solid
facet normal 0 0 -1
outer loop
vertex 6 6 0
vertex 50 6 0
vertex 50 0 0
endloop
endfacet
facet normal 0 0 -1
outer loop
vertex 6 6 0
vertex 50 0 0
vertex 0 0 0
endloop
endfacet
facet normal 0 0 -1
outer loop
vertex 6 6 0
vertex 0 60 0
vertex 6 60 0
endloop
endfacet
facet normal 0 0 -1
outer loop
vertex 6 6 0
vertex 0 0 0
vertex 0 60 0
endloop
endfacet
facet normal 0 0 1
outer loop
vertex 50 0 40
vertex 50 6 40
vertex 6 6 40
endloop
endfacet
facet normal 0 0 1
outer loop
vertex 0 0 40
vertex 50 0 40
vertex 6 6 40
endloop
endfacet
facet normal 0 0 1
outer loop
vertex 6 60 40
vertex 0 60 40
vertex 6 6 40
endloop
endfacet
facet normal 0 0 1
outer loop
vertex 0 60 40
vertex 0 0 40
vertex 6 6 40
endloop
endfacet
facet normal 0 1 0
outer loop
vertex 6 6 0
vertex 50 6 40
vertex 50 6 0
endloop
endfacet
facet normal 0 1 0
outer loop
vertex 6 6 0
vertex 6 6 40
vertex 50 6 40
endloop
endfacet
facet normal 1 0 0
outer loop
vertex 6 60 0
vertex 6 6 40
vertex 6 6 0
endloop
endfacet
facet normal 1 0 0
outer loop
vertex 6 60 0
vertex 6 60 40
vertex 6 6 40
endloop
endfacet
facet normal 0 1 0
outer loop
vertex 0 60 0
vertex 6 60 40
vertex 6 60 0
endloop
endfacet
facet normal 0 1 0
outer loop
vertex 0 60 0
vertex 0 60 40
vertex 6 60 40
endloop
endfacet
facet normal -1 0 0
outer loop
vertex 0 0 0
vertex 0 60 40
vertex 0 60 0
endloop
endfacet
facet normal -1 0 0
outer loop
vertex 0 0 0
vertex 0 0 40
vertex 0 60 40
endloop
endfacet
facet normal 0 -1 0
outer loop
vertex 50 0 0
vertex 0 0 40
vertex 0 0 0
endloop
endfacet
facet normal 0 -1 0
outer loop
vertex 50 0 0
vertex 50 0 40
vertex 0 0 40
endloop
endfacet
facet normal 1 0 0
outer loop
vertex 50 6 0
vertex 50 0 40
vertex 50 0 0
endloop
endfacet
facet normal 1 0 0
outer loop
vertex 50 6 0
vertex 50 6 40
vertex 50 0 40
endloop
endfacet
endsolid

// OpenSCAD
$fn = 32;

// ----------------------------------------------------------------------
// Structural section: angle 50 x 60 mm
// ----------------------------------------------------------------------

// --- parameters (mm) ---
sec_w = 50;               // leg width, X
sec_h = 60;               // leg height, Y
flange_t = 6;             // leg thickness
plate_t = 40;             // cut length, Z (extrusion height)

profile = [[0, 0], [50, 0], [50, 6], [6, 6], [6, 60], [0, 60]];  // primary outline, 6 points, counter clockwise

// --- the one profile operation ---
linear_extrude(height = plate_t) polygon(points = profile);
